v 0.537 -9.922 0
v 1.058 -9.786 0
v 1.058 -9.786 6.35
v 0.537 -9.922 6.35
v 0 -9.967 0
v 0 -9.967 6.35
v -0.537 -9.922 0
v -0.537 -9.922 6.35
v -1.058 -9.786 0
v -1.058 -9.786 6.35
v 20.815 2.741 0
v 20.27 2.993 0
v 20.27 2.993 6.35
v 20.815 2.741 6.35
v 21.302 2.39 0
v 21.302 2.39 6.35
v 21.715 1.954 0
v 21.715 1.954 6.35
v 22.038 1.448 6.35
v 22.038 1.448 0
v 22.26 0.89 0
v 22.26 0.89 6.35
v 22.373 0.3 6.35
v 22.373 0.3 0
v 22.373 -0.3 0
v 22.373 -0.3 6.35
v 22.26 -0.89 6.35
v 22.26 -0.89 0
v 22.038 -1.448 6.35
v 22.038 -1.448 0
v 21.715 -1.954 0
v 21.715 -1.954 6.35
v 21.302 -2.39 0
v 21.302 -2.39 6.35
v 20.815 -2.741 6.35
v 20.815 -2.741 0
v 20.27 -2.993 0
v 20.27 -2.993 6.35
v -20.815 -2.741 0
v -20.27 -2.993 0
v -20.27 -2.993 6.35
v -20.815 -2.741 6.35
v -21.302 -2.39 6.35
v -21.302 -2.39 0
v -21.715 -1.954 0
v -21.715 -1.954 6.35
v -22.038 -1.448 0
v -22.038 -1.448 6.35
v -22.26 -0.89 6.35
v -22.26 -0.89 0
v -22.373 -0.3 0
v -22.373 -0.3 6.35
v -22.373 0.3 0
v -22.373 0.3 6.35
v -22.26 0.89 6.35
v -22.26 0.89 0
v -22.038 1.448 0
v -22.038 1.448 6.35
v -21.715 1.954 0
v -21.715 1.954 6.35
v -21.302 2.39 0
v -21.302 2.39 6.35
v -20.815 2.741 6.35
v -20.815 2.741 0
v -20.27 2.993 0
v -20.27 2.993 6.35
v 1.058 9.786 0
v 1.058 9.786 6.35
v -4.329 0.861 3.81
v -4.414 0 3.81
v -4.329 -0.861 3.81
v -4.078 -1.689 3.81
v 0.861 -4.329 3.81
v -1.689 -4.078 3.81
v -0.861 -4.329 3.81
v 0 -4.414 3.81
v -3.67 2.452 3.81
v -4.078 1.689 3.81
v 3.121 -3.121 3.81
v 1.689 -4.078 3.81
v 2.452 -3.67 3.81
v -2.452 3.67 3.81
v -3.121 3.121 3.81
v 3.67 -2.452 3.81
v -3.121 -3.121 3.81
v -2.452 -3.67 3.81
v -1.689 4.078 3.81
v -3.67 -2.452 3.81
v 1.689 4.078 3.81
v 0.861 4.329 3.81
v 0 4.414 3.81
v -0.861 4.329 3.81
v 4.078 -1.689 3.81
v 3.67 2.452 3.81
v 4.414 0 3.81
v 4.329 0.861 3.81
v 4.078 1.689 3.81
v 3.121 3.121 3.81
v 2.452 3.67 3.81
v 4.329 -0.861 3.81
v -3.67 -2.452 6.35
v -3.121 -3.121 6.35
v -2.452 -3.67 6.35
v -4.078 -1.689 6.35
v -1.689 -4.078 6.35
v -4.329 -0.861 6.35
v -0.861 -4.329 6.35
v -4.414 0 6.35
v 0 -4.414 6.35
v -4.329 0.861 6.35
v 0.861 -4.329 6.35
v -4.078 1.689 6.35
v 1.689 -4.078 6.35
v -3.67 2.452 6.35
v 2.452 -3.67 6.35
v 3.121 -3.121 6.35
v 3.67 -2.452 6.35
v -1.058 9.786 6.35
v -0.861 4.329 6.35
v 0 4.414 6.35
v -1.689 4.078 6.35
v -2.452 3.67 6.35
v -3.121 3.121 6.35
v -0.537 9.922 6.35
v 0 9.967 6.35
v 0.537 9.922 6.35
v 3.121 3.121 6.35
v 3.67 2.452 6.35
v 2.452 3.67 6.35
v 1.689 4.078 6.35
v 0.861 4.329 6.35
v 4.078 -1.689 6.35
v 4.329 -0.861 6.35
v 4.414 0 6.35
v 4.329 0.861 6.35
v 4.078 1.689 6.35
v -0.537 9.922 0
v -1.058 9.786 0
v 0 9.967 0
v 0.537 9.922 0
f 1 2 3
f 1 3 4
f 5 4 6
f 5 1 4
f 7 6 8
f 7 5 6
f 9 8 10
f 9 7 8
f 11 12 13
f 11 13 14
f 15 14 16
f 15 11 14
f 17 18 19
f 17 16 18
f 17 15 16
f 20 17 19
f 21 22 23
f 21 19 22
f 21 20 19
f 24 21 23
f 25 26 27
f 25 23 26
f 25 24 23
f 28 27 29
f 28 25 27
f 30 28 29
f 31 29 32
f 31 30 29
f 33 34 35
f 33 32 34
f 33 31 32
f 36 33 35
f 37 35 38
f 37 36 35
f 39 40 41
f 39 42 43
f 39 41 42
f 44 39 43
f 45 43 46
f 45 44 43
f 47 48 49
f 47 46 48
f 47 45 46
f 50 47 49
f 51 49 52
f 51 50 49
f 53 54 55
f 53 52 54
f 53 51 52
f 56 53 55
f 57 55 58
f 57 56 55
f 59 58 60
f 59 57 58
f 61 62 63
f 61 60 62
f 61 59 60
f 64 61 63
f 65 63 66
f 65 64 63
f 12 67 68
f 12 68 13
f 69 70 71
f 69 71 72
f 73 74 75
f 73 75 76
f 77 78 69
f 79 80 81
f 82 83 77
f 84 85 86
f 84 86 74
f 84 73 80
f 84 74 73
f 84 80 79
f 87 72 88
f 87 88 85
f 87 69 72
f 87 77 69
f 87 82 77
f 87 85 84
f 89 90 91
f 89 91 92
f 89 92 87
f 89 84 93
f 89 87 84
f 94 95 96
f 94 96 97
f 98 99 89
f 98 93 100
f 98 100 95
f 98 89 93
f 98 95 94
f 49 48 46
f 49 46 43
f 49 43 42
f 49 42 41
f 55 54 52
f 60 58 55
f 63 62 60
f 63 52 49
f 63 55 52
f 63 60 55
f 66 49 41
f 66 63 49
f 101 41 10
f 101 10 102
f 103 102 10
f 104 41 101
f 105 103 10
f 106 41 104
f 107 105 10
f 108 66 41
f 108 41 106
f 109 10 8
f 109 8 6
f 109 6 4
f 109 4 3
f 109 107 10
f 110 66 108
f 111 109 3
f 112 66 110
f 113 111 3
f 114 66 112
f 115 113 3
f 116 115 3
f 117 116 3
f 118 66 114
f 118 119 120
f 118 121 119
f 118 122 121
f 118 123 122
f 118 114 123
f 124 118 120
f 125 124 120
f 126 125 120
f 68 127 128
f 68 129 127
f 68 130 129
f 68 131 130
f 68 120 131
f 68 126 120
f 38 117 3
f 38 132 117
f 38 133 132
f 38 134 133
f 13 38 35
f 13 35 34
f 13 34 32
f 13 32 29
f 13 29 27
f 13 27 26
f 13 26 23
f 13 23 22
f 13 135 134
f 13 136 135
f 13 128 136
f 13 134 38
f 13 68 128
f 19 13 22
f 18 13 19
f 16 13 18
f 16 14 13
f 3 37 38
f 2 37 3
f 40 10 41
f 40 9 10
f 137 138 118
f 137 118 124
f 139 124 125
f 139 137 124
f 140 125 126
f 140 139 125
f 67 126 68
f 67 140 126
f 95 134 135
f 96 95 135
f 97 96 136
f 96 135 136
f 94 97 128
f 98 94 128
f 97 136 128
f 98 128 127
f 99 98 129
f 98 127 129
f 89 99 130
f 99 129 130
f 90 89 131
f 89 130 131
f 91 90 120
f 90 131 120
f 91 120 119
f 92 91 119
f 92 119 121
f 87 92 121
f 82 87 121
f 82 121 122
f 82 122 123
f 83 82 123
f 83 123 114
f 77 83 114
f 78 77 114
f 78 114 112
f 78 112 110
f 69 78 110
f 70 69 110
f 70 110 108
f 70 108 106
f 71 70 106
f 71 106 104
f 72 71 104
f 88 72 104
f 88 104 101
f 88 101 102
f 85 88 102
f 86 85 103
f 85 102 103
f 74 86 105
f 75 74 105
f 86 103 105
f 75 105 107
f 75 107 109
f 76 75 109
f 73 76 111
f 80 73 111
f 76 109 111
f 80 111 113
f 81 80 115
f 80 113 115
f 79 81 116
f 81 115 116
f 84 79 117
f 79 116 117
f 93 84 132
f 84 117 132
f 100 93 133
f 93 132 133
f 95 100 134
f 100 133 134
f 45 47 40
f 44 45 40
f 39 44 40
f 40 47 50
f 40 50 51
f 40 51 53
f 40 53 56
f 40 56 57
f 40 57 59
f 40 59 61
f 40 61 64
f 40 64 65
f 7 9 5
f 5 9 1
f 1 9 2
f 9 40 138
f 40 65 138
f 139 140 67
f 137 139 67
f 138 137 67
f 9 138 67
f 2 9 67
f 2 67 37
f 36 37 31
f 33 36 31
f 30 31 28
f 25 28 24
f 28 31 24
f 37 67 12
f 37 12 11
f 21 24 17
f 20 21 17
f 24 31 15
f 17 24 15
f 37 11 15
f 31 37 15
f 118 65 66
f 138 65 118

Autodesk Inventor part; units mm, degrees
ref_plane "YZ Plane" through (0, 0, 0) normal (1, 0, 0) x (0, 1, 0)
ref_plane "XZ Plane" through (0, 0, 0) normal (0, 1, 0) x (-1, 0, 0)
ref_plane "XY Plane" through (0, 0, 0) normal (0, 0, 1) x (1, 0, 0)
sketch "Sketch1" plane through (0, 0, 0) normal (0, 0, 1) x (1, 0, 0)
  line L0 (1.0583, 9.7858) -> (20.2702, 2.9934)
  line L1 (20.2702, -2.9934) -> (1.0583, -9.7858)
  line L2 (-1.0583, -9.7858) -> (-20.2702, -2.9934)
  line L3 (-20.2702, 2.9934) -> (-1.0583, 9.7858)
  arc A0 (20.2702, -2.9934) -> (20.2702, 2.9934) centre (19.2118, 0) ccw
  arc A1 (-20.2702, 2.9934) -> (-20.2702, -2.9934) centre (-19.2118, 0) ccw
  arc A2 (1.0583, 9.7858) -> (-1.0583, 9.7858) centre (0, 6.7924) ccw
  arc A3 (-1.0583, -9.7858) -> (1.0583, -9.7858) centre (0, -6.7924) ccw
  point P0 (0, 10.16)
  point P1 (28.7368, 0)
  point P2 (0, -10.16)
  point P3 (-28.7368, 0)
  point P4 (0, 0)
  dimension "d0" = 30.48
  dimension "d1" = 20.32
  dimension "d2" = 3.175
extrude "Extrusion1" add sketch "Sketch1" along normal blind 6.35
sketch "Sketch2" plane through (0, 0, 6.35) normal (0, 0, 1) x (1, 0, 0)
  circle A0 centre (0, 0) radius 4.4138
extrude "Extrusion2" cut sketch "Sketch2" against normal blind 2.54
